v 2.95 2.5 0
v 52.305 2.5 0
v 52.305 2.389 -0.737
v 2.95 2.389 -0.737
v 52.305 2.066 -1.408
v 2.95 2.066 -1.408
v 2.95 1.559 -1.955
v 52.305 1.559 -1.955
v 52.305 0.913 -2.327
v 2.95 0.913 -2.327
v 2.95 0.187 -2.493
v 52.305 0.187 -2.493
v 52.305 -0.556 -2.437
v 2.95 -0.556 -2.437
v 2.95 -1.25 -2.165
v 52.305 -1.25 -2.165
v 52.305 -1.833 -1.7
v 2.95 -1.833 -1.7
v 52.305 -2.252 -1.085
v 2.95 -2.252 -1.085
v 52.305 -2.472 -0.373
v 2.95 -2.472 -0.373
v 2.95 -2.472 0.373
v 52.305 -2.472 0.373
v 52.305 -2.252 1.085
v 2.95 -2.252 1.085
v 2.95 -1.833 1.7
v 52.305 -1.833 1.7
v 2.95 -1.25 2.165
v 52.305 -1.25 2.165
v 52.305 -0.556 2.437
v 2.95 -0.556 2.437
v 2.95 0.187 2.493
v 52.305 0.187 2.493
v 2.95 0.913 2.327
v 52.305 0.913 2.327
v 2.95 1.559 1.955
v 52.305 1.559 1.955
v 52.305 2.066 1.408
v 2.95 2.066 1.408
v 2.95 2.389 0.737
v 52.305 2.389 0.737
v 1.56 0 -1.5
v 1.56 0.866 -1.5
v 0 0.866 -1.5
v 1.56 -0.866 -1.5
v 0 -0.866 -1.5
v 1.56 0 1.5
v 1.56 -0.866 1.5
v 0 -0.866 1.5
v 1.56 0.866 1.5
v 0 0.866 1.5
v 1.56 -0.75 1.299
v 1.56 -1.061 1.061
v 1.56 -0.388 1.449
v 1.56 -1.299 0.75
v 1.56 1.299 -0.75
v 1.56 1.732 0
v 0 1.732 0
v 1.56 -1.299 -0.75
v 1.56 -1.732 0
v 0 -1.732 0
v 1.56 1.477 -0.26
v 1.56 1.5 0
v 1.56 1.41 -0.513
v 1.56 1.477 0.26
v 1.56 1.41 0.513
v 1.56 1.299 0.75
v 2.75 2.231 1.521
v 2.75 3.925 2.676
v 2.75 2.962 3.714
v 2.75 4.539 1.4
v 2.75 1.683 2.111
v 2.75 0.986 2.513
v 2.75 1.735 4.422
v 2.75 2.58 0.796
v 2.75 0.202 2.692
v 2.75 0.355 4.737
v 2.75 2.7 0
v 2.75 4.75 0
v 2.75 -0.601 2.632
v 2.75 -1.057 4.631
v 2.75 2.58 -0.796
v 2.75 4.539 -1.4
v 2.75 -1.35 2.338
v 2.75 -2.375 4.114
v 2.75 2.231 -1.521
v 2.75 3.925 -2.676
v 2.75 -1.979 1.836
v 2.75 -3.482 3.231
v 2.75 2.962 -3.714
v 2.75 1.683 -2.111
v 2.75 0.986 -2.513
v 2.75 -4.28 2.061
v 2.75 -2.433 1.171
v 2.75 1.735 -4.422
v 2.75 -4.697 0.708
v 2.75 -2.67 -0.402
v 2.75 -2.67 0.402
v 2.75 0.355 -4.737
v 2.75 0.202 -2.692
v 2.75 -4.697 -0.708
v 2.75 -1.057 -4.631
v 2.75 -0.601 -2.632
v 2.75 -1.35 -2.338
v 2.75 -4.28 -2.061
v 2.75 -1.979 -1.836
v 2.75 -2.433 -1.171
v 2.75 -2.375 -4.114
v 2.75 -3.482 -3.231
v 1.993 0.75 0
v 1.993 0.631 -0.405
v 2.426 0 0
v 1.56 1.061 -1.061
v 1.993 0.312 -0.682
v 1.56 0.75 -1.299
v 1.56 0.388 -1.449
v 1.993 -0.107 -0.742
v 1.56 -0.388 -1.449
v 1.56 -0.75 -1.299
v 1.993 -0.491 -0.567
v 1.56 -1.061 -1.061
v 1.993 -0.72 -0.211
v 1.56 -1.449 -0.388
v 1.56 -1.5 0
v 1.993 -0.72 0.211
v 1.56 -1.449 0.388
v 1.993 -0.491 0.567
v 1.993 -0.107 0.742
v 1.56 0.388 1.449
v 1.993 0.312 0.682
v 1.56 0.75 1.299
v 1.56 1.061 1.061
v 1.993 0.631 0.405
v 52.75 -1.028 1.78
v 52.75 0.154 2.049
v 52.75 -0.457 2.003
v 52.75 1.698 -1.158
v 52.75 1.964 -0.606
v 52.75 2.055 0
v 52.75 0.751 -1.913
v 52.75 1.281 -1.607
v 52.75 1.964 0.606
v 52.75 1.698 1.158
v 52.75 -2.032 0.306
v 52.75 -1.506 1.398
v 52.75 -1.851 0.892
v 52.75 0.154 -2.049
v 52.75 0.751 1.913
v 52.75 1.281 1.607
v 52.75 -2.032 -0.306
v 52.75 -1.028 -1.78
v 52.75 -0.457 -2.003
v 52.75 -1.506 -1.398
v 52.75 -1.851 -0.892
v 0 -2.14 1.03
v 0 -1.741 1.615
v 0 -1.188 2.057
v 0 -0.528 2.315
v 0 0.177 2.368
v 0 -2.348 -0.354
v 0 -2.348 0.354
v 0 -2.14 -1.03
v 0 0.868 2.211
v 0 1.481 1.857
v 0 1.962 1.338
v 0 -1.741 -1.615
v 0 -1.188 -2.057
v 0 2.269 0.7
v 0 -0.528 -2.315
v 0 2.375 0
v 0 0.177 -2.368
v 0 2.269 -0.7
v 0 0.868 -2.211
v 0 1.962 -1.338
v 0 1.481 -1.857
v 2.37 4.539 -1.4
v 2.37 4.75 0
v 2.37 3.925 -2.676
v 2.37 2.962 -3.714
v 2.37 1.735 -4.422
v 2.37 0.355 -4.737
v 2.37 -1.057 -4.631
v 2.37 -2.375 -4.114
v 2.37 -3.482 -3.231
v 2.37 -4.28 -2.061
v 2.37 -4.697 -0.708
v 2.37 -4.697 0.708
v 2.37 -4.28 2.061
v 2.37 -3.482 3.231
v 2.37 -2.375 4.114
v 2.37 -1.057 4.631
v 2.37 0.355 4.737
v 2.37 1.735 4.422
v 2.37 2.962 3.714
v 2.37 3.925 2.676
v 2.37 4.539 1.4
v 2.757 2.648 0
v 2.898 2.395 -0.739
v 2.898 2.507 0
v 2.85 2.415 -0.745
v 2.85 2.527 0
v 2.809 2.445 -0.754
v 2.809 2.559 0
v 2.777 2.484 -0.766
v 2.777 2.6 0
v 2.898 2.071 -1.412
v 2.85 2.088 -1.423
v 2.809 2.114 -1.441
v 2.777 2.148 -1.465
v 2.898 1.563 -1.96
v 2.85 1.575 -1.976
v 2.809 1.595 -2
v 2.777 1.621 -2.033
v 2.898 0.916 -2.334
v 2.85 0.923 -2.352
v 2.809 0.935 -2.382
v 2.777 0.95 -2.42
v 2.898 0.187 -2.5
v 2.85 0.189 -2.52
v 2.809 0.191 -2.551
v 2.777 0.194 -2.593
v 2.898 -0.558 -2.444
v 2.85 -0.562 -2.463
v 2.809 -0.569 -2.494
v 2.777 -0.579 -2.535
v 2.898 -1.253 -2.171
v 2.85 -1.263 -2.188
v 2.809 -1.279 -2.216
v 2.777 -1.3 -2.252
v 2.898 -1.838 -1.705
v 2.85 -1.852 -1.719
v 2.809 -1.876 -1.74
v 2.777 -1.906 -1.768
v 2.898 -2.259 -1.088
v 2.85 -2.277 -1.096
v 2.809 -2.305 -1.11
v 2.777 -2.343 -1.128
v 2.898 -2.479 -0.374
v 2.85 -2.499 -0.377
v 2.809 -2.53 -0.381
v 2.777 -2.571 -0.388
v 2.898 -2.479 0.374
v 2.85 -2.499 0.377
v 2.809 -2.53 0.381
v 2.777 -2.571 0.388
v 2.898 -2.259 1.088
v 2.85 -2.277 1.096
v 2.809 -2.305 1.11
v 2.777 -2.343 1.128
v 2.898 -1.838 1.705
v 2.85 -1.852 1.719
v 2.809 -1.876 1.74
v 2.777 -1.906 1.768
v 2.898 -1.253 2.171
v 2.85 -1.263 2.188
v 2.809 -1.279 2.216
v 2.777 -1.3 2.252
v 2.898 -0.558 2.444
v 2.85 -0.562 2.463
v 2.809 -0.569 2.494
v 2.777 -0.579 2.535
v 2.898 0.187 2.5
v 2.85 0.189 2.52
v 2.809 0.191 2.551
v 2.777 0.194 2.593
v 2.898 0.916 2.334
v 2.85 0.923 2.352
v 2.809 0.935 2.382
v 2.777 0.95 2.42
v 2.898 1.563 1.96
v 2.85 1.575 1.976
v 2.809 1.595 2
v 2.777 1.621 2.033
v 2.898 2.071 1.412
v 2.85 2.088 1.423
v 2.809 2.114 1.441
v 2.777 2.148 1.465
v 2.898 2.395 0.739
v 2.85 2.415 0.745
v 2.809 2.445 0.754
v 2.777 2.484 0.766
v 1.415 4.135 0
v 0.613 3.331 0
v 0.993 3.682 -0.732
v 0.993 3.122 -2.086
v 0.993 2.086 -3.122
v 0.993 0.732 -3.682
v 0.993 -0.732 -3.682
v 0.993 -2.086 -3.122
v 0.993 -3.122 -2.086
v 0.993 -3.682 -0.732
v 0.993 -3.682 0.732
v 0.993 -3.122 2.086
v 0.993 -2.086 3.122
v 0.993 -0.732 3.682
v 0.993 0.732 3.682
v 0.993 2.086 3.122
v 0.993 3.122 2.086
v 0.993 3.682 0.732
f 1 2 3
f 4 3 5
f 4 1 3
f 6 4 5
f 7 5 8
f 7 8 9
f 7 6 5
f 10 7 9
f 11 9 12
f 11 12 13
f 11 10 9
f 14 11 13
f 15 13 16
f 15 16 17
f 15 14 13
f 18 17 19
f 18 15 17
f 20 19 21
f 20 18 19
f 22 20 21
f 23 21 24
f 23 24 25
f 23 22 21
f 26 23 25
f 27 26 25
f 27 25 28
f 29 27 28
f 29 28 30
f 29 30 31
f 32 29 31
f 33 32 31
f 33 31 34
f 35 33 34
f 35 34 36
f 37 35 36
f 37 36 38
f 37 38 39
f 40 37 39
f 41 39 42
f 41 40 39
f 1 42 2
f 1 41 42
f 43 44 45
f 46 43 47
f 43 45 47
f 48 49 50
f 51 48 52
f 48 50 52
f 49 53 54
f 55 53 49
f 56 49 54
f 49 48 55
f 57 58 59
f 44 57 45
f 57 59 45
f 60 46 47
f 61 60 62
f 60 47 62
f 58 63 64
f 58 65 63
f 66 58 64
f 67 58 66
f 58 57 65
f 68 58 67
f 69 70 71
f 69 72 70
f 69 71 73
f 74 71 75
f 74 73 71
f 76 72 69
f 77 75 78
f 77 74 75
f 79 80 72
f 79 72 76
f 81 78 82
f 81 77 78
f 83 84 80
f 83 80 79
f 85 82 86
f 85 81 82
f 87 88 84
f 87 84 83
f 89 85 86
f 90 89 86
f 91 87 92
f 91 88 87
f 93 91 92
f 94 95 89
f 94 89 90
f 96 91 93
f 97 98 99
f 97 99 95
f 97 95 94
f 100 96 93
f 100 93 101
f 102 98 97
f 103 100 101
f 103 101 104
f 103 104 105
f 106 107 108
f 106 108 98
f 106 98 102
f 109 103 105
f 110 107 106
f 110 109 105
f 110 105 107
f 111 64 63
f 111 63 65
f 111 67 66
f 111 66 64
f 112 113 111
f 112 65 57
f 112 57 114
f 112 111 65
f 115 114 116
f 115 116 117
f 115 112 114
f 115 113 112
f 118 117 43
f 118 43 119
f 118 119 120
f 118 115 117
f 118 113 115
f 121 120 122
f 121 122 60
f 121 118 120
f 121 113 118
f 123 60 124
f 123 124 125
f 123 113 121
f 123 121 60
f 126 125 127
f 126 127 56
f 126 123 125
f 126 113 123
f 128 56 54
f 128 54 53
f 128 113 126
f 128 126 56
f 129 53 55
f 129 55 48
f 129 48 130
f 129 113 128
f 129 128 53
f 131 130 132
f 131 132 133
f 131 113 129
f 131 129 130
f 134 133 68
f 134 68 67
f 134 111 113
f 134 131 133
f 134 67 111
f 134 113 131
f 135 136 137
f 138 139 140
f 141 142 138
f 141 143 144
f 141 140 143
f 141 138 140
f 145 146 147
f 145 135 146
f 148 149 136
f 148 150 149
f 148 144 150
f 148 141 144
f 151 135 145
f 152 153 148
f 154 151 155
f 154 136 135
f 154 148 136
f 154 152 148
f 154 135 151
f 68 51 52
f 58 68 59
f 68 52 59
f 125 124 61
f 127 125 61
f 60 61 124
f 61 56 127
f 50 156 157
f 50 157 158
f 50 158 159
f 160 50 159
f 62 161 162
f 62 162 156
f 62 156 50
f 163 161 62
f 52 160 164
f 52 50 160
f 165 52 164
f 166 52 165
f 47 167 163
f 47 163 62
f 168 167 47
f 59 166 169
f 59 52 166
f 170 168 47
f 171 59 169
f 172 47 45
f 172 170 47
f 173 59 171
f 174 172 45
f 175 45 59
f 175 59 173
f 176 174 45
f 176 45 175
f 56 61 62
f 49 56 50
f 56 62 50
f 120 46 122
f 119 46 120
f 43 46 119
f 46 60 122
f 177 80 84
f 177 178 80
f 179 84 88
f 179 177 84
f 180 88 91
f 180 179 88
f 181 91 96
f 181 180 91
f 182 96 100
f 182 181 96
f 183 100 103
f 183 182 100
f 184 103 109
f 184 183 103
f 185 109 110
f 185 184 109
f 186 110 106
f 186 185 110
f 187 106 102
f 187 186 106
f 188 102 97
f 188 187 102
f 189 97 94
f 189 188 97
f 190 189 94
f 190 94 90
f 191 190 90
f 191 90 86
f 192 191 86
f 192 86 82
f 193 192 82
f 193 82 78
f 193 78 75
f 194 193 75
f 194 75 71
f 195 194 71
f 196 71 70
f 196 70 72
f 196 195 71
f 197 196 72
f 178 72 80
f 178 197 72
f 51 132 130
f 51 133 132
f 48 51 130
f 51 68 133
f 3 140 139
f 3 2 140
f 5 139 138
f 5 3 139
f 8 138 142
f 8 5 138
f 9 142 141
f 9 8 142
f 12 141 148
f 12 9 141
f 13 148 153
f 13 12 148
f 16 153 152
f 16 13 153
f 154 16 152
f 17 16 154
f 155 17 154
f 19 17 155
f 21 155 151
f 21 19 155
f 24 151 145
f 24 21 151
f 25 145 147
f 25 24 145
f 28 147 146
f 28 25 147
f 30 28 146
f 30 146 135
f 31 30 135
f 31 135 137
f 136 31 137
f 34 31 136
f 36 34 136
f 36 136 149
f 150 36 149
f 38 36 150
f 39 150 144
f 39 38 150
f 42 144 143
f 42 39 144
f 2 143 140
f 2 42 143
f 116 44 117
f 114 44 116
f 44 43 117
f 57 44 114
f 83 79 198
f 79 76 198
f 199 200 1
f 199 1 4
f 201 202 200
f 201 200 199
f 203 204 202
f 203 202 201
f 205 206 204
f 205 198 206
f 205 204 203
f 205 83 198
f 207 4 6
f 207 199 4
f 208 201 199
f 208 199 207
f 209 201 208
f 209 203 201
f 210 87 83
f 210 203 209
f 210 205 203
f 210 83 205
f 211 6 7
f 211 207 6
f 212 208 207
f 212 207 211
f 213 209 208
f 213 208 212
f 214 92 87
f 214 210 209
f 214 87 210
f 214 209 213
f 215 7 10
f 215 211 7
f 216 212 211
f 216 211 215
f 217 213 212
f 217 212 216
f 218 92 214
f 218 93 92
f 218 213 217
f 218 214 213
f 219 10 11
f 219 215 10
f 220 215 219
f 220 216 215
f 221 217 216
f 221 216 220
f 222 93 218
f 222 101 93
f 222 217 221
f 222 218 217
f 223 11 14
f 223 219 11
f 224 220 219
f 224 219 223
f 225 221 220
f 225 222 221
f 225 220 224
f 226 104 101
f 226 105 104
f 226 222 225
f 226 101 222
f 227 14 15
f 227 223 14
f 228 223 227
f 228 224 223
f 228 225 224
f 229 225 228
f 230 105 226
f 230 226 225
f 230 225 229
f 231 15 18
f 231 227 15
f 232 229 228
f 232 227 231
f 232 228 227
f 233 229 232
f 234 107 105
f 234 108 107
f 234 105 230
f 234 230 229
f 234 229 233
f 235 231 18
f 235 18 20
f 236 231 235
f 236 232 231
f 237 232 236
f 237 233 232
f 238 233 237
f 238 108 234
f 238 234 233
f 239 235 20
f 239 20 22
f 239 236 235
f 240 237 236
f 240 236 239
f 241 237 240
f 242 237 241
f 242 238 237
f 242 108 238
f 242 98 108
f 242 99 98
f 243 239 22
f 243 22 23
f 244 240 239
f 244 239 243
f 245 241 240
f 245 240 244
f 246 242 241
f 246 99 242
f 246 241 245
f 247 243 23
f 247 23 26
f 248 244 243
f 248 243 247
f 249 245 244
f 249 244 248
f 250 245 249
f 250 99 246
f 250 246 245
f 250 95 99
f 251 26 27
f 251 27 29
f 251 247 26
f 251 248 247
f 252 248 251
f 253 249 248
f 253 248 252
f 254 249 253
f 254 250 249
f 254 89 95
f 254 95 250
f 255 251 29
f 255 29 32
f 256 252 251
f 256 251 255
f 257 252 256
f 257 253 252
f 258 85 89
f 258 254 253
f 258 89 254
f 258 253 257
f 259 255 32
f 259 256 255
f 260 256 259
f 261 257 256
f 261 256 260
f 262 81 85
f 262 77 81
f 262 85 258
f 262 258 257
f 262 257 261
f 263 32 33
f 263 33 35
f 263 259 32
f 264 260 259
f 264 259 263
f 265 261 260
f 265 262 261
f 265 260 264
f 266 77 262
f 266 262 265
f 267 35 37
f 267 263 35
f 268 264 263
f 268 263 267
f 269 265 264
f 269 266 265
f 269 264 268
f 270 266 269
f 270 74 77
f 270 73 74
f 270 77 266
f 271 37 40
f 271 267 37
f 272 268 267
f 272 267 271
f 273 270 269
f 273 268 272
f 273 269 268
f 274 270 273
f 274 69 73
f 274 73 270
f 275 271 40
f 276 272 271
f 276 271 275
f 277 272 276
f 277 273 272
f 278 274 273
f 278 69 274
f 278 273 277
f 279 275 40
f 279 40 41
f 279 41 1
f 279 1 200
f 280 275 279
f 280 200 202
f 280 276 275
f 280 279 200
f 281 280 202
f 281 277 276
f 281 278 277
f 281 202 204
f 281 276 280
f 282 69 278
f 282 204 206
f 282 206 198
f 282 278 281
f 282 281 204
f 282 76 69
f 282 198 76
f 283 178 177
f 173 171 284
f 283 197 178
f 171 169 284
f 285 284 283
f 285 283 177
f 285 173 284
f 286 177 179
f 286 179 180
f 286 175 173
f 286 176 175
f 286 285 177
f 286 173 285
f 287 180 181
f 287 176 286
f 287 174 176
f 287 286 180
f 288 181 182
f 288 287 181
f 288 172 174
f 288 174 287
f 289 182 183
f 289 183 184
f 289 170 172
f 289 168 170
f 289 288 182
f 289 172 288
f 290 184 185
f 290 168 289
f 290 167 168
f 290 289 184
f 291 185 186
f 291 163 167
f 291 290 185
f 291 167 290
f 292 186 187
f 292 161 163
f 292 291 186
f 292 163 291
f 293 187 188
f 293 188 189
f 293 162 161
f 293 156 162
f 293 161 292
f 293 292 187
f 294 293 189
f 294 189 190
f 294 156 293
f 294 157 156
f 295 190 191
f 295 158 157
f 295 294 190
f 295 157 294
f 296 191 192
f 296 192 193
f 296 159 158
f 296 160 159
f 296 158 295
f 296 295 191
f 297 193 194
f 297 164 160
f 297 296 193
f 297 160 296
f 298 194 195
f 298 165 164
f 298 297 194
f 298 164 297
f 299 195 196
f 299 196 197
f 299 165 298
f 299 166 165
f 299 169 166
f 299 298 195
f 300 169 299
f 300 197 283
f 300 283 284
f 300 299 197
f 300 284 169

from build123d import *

# Parameters (mm, degrees)
FILLET_1_R  = 0.2
HEX_2_DEPTH = 1.56


with BuildPart() as part:
    # Эскиз1 → Body (revolve)
    with BuildSketch(Plane.XY):
        with BuildLine():
            Line((0, 2.375), (0, 0))
            Line((0, 0), (52.75, 0))
            Line((52.75, 0), (52.75, 2.055))
            Line((52.75, 2.055), (52.305, 2.5))
            Line((52.305, 2.5), (2.75, 2.5))
            Line((2.75, 2.5), (2.75, 4.75))
            Line((2.75, 4.75), (2.370164642, 4.75))
            ThreePointArc((2.370164642, 4.75), (0.992749859, 3.754440885), (0, 2.375))
        make_face()
    revolve(axis=Axis((-3.643489966, 0, 0), (-1, 0, 0)))

    # Скругление1
    fillet_1_edges = [part.edges().sort_by_distance(p)[0] for p in [
        (2.75, -2.5, 0),
    ]]
    fillet(fillet_1_edges, radius=FILLET_1_R)

    # Эскиз2 → Вырез-Повернуть1 (revolve, cut)
    with BuildSketch(Plane.XY):
        Polygon((0, 0), (0, 1.5), (1.56, 1.5), (2.426025404, 0), align=None)
    revolve(axis=Axis((2.426025404, 0, 0), (-1, 0, 0)), mode=Mode.SUBTRACT)

    # Эскиз3 → Hex 2 (cut)
    with BuildSketch(Plane.ZY):
        Polygon((-1.5, -0.866025404), (0, -1.732050808), (1.5, -0.866025404), (1.5, 0.866025404), (0, 1.732050808), (-1.5, 0.866025404), align=None)
    extrude(amount=-HEX_2_DEPTH, mode=Mode.SUBTRACT)


solid = part.part
